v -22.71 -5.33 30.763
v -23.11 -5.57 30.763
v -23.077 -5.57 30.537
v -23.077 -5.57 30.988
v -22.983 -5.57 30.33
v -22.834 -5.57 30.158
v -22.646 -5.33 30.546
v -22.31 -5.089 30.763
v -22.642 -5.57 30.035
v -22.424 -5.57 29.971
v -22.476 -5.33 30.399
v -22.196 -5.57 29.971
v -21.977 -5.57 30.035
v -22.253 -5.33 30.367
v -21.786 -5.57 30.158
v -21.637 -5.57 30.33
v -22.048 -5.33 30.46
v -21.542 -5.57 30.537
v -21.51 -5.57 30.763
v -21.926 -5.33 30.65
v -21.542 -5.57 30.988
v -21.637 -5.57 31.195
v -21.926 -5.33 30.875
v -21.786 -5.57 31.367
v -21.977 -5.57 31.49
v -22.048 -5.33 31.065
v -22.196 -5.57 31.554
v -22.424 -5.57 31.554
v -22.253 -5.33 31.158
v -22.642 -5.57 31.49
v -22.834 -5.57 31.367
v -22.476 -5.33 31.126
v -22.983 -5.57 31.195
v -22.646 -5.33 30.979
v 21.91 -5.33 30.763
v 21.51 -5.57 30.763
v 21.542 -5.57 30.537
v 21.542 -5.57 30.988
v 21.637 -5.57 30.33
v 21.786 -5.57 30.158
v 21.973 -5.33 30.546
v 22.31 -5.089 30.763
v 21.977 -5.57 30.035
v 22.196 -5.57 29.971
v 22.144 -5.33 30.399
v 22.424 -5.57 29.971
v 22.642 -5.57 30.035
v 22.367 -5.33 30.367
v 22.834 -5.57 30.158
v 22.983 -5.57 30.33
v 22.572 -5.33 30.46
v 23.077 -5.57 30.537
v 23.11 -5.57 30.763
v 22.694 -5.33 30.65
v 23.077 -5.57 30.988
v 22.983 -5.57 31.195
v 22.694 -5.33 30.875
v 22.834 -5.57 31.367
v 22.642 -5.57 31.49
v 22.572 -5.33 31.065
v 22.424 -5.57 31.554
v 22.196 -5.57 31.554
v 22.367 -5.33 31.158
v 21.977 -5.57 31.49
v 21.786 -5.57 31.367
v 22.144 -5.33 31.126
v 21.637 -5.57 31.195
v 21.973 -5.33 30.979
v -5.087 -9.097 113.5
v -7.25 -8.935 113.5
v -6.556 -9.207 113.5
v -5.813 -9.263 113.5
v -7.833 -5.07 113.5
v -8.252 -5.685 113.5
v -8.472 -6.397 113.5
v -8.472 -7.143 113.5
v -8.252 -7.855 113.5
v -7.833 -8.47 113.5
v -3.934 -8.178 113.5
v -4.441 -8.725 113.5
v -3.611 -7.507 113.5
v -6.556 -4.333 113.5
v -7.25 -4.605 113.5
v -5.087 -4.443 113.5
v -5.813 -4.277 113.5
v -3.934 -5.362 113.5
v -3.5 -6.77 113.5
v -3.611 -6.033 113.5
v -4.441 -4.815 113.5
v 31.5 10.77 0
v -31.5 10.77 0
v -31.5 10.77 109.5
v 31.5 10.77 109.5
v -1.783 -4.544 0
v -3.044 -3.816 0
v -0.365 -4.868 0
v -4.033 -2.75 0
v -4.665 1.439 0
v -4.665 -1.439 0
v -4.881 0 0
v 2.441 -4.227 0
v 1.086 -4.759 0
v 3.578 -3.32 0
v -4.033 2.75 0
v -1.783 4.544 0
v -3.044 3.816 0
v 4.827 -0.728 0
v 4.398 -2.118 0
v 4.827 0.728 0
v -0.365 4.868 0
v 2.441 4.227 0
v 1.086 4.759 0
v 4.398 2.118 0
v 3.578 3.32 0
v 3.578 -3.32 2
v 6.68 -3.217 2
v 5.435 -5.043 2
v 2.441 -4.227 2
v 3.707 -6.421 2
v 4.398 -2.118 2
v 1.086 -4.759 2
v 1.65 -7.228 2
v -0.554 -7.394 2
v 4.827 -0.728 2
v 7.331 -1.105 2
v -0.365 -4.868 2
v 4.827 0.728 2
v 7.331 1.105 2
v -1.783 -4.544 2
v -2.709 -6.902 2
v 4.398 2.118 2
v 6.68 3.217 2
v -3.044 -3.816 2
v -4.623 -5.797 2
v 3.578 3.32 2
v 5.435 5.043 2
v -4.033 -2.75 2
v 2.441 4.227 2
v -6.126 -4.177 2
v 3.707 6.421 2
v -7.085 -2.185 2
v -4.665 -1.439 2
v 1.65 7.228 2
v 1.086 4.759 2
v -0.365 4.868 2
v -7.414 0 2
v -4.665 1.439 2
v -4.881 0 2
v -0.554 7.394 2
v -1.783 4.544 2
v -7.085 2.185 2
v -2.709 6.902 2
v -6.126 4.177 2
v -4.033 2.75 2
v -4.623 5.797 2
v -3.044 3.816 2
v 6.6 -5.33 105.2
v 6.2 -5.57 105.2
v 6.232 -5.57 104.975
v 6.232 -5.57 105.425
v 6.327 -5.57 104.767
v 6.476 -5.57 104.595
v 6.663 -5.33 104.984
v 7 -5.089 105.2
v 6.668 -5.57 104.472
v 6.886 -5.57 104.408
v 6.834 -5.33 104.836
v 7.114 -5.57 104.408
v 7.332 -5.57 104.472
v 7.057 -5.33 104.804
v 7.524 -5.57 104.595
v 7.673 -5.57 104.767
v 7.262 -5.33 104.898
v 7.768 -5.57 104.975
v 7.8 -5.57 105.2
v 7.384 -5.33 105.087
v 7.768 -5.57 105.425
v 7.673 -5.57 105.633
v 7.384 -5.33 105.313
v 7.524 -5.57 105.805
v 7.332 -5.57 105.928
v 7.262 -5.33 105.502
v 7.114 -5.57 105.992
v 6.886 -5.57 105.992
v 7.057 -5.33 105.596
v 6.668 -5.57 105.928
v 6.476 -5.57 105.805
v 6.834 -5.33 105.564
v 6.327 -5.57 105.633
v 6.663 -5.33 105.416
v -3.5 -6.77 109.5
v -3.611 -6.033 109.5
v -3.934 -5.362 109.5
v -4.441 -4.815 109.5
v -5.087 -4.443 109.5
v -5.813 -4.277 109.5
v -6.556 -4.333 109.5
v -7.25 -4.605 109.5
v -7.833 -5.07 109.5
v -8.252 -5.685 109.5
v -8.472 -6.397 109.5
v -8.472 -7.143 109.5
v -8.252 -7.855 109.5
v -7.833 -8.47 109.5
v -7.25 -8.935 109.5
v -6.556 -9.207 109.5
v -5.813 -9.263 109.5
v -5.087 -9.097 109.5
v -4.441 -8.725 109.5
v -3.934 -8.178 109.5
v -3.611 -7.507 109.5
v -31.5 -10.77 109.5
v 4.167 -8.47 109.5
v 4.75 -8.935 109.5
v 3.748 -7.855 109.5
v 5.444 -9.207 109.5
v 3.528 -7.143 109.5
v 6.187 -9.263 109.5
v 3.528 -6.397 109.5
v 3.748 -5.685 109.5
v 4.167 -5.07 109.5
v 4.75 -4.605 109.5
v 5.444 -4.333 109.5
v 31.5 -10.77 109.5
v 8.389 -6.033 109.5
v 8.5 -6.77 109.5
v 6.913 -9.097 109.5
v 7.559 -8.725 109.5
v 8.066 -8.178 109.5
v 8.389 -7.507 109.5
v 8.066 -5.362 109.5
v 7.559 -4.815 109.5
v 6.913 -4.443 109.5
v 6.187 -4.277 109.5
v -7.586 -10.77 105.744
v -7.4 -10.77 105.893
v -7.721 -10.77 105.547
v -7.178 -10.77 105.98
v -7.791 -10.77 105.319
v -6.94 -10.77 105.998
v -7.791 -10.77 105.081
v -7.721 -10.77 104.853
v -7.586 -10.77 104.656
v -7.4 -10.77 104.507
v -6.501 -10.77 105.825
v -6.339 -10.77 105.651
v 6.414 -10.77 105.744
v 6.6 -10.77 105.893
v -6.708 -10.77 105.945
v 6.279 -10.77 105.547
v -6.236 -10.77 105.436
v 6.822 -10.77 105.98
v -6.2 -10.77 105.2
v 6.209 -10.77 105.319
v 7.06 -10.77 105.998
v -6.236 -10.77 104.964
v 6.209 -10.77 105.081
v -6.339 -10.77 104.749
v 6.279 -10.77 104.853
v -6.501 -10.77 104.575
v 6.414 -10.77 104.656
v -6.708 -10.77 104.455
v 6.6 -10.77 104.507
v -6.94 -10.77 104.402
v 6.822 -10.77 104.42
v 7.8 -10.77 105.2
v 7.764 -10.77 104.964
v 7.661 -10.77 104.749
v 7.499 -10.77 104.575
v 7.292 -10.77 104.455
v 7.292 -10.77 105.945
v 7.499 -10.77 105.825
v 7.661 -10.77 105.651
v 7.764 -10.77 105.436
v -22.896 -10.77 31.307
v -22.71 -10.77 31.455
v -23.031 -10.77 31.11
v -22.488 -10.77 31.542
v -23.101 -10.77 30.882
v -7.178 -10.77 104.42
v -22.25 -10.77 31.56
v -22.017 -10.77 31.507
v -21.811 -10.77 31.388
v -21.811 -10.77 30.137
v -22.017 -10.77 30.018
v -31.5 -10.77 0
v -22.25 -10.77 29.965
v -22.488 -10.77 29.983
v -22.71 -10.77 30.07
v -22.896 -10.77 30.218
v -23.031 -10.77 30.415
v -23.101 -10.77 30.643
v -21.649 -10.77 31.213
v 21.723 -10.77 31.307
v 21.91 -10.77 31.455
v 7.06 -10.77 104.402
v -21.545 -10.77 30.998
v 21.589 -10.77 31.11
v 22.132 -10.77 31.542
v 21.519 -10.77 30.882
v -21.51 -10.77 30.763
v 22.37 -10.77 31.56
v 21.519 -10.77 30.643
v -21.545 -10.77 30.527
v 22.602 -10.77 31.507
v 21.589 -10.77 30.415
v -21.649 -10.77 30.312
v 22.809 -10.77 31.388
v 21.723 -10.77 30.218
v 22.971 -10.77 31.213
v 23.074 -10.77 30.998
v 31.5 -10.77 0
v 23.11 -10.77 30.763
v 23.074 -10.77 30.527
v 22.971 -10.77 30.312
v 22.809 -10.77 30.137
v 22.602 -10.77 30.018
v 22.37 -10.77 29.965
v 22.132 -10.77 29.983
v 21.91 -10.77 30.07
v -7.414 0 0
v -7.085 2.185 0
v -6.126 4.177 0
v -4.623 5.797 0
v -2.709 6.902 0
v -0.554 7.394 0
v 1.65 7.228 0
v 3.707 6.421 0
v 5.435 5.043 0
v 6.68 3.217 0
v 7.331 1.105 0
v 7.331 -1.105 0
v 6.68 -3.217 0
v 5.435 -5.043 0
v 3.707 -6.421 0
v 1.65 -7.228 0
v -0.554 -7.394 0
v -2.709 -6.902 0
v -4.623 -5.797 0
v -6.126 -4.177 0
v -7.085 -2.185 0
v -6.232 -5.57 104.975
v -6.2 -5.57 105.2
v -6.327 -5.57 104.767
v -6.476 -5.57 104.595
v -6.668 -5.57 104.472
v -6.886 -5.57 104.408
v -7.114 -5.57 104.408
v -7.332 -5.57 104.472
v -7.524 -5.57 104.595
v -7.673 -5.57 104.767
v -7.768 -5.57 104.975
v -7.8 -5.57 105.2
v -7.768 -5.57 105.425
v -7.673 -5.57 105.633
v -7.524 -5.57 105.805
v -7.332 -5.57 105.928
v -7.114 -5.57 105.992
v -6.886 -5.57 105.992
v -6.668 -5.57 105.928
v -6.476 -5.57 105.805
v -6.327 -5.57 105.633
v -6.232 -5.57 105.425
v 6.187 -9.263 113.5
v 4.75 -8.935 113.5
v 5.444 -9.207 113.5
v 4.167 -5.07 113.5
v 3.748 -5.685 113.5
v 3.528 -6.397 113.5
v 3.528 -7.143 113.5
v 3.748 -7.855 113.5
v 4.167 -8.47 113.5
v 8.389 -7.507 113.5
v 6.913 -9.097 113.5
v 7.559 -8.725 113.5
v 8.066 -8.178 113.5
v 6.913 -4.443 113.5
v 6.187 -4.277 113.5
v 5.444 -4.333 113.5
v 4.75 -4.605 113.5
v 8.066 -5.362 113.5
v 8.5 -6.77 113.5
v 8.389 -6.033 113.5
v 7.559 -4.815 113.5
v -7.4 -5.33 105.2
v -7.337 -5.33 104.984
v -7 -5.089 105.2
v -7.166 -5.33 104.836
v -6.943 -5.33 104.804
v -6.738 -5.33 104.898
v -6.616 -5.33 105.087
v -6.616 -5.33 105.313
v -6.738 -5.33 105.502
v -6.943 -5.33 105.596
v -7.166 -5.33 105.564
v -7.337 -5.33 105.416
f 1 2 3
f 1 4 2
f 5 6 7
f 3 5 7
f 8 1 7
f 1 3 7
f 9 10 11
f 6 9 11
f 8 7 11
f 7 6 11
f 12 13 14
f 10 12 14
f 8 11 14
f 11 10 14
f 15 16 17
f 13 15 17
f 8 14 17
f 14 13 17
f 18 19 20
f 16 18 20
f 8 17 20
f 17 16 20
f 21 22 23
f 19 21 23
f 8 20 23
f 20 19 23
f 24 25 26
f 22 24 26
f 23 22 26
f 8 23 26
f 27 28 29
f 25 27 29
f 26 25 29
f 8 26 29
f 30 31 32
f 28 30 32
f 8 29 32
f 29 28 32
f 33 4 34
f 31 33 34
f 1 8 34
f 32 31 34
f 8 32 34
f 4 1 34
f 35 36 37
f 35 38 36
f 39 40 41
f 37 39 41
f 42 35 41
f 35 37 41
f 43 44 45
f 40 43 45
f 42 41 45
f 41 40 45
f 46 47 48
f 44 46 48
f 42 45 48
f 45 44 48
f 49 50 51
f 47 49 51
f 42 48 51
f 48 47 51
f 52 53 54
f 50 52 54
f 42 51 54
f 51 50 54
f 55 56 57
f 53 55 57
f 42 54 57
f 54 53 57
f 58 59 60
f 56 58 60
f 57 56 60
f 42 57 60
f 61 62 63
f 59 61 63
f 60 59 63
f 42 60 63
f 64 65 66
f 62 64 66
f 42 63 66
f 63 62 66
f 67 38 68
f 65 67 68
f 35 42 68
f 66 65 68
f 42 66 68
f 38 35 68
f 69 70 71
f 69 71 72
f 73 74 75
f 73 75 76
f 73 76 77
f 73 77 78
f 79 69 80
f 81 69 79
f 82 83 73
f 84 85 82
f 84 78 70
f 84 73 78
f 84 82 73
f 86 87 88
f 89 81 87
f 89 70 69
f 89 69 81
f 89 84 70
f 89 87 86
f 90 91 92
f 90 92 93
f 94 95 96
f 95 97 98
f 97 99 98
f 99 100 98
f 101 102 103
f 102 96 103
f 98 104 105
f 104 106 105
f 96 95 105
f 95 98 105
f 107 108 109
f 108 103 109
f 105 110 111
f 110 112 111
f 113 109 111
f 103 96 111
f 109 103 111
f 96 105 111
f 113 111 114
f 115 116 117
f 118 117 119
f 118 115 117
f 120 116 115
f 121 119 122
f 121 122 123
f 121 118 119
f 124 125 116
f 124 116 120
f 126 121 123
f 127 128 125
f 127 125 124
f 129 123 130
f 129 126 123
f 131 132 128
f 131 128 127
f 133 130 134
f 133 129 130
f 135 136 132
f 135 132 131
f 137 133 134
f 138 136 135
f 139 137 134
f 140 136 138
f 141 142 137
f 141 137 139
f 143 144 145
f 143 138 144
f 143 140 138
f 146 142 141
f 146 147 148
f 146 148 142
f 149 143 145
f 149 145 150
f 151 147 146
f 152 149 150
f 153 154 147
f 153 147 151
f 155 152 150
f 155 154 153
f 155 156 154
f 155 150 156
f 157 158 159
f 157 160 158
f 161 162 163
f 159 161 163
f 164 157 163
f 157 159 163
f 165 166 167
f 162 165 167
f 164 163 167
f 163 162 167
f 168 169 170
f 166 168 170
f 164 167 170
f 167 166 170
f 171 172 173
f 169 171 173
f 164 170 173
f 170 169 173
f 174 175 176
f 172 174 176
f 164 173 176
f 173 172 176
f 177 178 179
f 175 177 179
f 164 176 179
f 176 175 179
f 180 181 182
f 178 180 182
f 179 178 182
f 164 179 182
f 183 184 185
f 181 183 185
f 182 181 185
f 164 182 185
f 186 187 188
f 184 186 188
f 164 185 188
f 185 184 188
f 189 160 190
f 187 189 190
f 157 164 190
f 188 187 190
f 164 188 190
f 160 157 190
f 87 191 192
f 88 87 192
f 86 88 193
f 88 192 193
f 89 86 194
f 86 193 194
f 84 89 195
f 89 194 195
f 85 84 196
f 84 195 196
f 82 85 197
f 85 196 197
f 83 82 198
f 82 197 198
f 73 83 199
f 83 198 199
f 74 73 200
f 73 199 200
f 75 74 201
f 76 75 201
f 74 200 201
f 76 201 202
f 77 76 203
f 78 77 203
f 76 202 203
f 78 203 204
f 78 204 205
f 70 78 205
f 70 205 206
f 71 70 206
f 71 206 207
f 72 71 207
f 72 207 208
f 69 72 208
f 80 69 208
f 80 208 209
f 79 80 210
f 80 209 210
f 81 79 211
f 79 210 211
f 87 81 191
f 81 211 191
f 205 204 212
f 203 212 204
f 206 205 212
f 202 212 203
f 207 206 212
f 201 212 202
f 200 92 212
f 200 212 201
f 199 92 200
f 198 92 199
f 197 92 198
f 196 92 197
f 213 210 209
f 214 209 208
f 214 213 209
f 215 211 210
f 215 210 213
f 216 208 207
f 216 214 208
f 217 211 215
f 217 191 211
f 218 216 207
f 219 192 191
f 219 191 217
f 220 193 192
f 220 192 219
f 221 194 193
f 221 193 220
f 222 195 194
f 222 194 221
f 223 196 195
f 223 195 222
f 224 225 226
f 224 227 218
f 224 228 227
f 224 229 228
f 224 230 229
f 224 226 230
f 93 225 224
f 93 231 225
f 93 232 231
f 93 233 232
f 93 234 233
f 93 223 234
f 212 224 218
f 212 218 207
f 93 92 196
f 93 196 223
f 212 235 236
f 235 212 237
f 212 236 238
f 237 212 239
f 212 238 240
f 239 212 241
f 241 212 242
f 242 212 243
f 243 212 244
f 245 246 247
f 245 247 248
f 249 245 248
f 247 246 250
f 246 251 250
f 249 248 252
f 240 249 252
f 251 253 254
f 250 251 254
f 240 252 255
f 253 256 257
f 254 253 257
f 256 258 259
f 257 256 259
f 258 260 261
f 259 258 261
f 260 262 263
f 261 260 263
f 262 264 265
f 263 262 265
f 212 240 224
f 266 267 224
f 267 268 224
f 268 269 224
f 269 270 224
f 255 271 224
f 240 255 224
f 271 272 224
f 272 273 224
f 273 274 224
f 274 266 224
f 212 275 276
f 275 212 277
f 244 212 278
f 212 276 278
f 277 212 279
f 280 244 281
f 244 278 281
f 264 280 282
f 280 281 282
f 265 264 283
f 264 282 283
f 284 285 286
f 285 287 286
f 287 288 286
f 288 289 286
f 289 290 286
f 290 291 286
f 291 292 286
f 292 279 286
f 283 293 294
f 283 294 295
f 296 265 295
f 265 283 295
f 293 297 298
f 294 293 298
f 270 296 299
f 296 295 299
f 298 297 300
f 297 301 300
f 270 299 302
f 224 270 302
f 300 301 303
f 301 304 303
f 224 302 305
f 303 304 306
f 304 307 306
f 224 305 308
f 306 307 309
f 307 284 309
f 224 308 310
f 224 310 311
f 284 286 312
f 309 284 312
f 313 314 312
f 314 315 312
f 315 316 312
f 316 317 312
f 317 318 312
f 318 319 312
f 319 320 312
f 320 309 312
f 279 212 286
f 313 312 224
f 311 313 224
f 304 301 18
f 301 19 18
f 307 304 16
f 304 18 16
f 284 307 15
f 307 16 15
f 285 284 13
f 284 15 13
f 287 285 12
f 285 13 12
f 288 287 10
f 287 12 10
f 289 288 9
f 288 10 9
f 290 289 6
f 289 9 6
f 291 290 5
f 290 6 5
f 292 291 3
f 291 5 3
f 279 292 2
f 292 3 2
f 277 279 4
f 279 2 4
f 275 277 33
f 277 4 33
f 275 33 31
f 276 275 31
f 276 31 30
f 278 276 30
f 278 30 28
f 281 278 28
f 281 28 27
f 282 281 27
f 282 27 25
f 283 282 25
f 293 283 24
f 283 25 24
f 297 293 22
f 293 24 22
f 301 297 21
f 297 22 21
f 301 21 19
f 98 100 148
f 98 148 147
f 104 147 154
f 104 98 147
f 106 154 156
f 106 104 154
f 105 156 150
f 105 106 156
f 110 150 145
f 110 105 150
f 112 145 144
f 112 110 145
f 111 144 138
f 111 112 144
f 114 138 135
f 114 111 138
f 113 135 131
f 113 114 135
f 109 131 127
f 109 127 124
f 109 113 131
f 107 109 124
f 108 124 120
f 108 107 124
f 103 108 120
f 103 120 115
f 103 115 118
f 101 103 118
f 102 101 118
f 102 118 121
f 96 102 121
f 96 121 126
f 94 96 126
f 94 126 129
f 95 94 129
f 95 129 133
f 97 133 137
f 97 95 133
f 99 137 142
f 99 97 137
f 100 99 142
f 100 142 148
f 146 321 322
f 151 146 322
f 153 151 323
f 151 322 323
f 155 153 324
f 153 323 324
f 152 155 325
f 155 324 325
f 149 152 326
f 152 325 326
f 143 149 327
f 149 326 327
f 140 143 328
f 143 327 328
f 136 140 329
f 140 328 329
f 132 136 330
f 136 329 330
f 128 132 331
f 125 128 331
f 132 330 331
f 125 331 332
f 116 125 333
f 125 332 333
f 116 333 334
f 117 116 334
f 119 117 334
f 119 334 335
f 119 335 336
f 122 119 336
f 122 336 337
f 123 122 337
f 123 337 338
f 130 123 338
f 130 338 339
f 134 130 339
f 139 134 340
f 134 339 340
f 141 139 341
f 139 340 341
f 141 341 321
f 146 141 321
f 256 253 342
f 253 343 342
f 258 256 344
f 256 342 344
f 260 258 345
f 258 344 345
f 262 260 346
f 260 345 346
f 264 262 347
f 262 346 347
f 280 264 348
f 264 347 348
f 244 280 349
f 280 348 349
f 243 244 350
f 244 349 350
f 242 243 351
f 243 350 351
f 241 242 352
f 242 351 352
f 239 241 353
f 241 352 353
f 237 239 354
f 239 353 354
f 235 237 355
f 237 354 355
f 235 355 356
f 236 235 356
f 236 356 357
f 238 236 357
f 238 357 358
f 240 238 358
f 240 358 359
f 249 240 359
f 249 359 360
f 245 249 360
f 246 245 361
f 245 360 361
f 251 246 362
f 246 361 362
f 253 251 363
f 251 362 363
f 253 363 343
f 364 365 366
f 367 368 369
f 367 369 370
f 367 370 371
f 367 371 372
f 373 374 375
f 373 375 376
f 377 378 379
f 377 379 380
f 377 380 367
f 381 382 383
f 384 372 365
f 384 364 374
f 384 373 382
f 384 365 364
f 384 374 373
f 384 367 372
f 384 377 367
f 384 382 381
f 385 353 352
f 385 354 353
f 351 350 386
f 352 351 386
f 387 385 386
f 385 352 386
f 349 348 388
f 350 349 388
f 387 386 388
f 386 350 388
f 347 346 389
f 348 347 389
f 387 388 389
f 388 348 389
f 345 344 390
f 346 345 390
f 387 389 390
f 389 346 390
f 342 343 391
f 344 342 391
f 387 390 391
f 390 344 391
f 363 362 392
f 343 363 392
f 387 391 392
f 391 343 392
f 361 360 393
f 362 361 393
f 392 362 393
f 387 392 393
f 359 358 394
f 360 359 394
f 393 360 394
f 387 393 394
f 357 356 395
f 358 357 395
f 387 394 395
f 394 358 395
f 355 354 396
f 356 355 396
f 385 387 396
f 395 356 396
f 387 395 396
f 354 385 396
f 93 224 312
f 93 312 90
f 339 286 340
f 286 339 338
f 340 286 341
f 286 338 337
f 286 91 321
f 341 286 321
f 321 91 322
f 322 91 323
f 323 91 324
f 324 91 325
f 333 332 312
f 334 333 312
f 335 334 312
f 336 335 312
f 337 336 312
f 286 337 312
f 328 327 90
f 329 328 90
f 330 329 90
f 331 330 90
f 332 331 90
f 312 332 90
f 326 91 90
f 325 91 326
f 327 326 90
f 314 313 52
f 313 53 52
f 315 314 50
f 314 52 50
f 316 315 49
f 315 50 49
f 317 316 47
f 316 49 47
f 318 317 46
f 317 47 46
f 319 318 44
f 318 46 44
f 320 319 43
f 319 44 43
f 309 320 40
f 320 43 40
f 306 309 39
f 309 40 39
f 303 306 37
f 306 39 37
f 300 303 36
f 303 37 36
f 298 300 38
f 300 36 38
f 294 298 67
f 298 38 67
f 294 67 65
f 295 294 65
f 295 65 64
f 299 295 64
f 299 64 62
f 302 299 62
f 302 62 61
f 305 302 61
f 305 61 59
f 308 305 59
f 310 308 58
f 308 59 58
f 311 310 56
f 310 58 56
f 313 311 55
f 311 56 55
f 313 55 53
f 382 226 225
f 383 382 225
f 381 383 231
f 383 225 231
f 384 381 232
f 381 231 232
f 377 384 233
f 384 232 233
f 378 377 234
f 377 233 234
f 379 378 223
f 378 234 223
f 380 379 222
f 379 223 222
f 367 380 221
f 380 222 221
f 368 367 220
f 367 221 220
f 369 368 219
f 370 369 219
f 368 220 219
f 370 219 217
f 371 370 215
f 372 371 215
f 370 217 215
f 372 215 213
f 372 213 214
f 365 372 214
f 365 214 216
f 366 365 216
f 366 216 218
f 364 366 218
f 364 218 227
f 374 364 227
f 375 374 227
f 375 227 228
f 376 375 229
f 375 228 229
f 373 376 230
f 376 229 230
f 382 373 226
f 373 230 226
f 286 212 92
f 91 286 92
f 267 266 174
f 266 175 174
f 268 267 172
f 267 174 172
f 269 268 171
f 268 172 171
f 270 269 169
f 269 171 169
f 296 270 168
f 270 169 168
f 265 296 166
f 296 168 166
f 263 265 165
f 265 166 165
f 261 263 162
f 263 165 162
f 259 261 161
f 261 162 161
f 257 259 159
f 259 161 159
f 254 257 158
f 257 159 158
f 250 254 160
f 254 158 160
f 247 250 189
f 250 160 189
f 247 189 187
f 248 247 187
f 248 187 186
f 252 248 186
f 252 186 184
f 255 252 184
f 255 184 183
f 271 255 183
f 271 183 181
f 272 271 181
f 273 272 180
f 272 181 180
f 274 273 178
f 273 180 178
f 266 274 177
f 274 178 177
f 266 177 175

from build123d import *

# Parameters (mm, degrees)
SKETCH_1_W             = 63
SKETCH_1_H             = 21.54
EXTRUDE_1_DEPTH        = 109.5
HOLE_WIZARD_M2_1_D     = 1.6
HOLE_WIZARD_M2_1_DEPTH = 5.2
HOLE_WIZARD_M2_1_TIP   = 0.480688495
SKETCH_4_R             = 2.5
EXTRUDE_2_DEPTH        = 4
SKETCH_5_R             = 7.414302321
SKETCH_5_R_2           = 4.881421022
CUT_EXTRUDE_1_DEPTH    = 2


with BuildPart() as part:
    # 草图1 → 凸台-拉伸1 (new body)
    with BuildSketch(Plane.XY):
        Rectangle(SKETCH_1_W, SKETCH_1_H)
    extrude(amount=EXTRUDE_1_DEPTH)

    # M2 螺纹孔1
    with Locations(Plane(origin=(0, -10.77, 0), x_dir=(-1, 0, 0), z_dir=(0, -1, 0))):
        with Locations((7, -105.2), (-7, -105.2), (-22.309756999, -30.762521908), (22.309756999, -30.762521908)):
            Hole(HOLE_WIZARD_M2_1_D / 2, depth=HOLE_WIZARD_M2_1_DEPTH)
            with Locations((0, 0, -(HOLE_WIZARD_M2_1_DEPTH + HOLE_WIZARD_M2_1_TIP / 2))):  # 118° drill point
                Cone(0, HOLE_WIZARD_M2_1_D / 2, HOLE_WIZARD_M2_1_TIP, mode=Mode.SUBTRACT)

    # 草图4 → 凸台-拉伸2 (add)
    with BuildSketch(Plane.XY.offset(109.5)):
        with Locations((-6, -6.77)):
            Circle(SKETCH_4_R)
        with Locations((6, -6.77)):
            Circle(SKETCH_4_R)
    extrude(amount=EXTRUDE_2_DEPTH)

    # 草图5 → 切除-拉伸1 (cut)
    with BuildSketch(Plane(origin=(0, 0, 0), x_dir=(-1, 0, 0), z_dir=(0, 0, -1))):
        Circle(SKETCH_5_R)
        Circle(SKETCH_5_R_2, mode=Mode.SUBTRACT)
    extrude(amount=-CUT_EXTRUDE_1_DEPTH, mode=Mode.SUBTRACT)


solid = part.part
